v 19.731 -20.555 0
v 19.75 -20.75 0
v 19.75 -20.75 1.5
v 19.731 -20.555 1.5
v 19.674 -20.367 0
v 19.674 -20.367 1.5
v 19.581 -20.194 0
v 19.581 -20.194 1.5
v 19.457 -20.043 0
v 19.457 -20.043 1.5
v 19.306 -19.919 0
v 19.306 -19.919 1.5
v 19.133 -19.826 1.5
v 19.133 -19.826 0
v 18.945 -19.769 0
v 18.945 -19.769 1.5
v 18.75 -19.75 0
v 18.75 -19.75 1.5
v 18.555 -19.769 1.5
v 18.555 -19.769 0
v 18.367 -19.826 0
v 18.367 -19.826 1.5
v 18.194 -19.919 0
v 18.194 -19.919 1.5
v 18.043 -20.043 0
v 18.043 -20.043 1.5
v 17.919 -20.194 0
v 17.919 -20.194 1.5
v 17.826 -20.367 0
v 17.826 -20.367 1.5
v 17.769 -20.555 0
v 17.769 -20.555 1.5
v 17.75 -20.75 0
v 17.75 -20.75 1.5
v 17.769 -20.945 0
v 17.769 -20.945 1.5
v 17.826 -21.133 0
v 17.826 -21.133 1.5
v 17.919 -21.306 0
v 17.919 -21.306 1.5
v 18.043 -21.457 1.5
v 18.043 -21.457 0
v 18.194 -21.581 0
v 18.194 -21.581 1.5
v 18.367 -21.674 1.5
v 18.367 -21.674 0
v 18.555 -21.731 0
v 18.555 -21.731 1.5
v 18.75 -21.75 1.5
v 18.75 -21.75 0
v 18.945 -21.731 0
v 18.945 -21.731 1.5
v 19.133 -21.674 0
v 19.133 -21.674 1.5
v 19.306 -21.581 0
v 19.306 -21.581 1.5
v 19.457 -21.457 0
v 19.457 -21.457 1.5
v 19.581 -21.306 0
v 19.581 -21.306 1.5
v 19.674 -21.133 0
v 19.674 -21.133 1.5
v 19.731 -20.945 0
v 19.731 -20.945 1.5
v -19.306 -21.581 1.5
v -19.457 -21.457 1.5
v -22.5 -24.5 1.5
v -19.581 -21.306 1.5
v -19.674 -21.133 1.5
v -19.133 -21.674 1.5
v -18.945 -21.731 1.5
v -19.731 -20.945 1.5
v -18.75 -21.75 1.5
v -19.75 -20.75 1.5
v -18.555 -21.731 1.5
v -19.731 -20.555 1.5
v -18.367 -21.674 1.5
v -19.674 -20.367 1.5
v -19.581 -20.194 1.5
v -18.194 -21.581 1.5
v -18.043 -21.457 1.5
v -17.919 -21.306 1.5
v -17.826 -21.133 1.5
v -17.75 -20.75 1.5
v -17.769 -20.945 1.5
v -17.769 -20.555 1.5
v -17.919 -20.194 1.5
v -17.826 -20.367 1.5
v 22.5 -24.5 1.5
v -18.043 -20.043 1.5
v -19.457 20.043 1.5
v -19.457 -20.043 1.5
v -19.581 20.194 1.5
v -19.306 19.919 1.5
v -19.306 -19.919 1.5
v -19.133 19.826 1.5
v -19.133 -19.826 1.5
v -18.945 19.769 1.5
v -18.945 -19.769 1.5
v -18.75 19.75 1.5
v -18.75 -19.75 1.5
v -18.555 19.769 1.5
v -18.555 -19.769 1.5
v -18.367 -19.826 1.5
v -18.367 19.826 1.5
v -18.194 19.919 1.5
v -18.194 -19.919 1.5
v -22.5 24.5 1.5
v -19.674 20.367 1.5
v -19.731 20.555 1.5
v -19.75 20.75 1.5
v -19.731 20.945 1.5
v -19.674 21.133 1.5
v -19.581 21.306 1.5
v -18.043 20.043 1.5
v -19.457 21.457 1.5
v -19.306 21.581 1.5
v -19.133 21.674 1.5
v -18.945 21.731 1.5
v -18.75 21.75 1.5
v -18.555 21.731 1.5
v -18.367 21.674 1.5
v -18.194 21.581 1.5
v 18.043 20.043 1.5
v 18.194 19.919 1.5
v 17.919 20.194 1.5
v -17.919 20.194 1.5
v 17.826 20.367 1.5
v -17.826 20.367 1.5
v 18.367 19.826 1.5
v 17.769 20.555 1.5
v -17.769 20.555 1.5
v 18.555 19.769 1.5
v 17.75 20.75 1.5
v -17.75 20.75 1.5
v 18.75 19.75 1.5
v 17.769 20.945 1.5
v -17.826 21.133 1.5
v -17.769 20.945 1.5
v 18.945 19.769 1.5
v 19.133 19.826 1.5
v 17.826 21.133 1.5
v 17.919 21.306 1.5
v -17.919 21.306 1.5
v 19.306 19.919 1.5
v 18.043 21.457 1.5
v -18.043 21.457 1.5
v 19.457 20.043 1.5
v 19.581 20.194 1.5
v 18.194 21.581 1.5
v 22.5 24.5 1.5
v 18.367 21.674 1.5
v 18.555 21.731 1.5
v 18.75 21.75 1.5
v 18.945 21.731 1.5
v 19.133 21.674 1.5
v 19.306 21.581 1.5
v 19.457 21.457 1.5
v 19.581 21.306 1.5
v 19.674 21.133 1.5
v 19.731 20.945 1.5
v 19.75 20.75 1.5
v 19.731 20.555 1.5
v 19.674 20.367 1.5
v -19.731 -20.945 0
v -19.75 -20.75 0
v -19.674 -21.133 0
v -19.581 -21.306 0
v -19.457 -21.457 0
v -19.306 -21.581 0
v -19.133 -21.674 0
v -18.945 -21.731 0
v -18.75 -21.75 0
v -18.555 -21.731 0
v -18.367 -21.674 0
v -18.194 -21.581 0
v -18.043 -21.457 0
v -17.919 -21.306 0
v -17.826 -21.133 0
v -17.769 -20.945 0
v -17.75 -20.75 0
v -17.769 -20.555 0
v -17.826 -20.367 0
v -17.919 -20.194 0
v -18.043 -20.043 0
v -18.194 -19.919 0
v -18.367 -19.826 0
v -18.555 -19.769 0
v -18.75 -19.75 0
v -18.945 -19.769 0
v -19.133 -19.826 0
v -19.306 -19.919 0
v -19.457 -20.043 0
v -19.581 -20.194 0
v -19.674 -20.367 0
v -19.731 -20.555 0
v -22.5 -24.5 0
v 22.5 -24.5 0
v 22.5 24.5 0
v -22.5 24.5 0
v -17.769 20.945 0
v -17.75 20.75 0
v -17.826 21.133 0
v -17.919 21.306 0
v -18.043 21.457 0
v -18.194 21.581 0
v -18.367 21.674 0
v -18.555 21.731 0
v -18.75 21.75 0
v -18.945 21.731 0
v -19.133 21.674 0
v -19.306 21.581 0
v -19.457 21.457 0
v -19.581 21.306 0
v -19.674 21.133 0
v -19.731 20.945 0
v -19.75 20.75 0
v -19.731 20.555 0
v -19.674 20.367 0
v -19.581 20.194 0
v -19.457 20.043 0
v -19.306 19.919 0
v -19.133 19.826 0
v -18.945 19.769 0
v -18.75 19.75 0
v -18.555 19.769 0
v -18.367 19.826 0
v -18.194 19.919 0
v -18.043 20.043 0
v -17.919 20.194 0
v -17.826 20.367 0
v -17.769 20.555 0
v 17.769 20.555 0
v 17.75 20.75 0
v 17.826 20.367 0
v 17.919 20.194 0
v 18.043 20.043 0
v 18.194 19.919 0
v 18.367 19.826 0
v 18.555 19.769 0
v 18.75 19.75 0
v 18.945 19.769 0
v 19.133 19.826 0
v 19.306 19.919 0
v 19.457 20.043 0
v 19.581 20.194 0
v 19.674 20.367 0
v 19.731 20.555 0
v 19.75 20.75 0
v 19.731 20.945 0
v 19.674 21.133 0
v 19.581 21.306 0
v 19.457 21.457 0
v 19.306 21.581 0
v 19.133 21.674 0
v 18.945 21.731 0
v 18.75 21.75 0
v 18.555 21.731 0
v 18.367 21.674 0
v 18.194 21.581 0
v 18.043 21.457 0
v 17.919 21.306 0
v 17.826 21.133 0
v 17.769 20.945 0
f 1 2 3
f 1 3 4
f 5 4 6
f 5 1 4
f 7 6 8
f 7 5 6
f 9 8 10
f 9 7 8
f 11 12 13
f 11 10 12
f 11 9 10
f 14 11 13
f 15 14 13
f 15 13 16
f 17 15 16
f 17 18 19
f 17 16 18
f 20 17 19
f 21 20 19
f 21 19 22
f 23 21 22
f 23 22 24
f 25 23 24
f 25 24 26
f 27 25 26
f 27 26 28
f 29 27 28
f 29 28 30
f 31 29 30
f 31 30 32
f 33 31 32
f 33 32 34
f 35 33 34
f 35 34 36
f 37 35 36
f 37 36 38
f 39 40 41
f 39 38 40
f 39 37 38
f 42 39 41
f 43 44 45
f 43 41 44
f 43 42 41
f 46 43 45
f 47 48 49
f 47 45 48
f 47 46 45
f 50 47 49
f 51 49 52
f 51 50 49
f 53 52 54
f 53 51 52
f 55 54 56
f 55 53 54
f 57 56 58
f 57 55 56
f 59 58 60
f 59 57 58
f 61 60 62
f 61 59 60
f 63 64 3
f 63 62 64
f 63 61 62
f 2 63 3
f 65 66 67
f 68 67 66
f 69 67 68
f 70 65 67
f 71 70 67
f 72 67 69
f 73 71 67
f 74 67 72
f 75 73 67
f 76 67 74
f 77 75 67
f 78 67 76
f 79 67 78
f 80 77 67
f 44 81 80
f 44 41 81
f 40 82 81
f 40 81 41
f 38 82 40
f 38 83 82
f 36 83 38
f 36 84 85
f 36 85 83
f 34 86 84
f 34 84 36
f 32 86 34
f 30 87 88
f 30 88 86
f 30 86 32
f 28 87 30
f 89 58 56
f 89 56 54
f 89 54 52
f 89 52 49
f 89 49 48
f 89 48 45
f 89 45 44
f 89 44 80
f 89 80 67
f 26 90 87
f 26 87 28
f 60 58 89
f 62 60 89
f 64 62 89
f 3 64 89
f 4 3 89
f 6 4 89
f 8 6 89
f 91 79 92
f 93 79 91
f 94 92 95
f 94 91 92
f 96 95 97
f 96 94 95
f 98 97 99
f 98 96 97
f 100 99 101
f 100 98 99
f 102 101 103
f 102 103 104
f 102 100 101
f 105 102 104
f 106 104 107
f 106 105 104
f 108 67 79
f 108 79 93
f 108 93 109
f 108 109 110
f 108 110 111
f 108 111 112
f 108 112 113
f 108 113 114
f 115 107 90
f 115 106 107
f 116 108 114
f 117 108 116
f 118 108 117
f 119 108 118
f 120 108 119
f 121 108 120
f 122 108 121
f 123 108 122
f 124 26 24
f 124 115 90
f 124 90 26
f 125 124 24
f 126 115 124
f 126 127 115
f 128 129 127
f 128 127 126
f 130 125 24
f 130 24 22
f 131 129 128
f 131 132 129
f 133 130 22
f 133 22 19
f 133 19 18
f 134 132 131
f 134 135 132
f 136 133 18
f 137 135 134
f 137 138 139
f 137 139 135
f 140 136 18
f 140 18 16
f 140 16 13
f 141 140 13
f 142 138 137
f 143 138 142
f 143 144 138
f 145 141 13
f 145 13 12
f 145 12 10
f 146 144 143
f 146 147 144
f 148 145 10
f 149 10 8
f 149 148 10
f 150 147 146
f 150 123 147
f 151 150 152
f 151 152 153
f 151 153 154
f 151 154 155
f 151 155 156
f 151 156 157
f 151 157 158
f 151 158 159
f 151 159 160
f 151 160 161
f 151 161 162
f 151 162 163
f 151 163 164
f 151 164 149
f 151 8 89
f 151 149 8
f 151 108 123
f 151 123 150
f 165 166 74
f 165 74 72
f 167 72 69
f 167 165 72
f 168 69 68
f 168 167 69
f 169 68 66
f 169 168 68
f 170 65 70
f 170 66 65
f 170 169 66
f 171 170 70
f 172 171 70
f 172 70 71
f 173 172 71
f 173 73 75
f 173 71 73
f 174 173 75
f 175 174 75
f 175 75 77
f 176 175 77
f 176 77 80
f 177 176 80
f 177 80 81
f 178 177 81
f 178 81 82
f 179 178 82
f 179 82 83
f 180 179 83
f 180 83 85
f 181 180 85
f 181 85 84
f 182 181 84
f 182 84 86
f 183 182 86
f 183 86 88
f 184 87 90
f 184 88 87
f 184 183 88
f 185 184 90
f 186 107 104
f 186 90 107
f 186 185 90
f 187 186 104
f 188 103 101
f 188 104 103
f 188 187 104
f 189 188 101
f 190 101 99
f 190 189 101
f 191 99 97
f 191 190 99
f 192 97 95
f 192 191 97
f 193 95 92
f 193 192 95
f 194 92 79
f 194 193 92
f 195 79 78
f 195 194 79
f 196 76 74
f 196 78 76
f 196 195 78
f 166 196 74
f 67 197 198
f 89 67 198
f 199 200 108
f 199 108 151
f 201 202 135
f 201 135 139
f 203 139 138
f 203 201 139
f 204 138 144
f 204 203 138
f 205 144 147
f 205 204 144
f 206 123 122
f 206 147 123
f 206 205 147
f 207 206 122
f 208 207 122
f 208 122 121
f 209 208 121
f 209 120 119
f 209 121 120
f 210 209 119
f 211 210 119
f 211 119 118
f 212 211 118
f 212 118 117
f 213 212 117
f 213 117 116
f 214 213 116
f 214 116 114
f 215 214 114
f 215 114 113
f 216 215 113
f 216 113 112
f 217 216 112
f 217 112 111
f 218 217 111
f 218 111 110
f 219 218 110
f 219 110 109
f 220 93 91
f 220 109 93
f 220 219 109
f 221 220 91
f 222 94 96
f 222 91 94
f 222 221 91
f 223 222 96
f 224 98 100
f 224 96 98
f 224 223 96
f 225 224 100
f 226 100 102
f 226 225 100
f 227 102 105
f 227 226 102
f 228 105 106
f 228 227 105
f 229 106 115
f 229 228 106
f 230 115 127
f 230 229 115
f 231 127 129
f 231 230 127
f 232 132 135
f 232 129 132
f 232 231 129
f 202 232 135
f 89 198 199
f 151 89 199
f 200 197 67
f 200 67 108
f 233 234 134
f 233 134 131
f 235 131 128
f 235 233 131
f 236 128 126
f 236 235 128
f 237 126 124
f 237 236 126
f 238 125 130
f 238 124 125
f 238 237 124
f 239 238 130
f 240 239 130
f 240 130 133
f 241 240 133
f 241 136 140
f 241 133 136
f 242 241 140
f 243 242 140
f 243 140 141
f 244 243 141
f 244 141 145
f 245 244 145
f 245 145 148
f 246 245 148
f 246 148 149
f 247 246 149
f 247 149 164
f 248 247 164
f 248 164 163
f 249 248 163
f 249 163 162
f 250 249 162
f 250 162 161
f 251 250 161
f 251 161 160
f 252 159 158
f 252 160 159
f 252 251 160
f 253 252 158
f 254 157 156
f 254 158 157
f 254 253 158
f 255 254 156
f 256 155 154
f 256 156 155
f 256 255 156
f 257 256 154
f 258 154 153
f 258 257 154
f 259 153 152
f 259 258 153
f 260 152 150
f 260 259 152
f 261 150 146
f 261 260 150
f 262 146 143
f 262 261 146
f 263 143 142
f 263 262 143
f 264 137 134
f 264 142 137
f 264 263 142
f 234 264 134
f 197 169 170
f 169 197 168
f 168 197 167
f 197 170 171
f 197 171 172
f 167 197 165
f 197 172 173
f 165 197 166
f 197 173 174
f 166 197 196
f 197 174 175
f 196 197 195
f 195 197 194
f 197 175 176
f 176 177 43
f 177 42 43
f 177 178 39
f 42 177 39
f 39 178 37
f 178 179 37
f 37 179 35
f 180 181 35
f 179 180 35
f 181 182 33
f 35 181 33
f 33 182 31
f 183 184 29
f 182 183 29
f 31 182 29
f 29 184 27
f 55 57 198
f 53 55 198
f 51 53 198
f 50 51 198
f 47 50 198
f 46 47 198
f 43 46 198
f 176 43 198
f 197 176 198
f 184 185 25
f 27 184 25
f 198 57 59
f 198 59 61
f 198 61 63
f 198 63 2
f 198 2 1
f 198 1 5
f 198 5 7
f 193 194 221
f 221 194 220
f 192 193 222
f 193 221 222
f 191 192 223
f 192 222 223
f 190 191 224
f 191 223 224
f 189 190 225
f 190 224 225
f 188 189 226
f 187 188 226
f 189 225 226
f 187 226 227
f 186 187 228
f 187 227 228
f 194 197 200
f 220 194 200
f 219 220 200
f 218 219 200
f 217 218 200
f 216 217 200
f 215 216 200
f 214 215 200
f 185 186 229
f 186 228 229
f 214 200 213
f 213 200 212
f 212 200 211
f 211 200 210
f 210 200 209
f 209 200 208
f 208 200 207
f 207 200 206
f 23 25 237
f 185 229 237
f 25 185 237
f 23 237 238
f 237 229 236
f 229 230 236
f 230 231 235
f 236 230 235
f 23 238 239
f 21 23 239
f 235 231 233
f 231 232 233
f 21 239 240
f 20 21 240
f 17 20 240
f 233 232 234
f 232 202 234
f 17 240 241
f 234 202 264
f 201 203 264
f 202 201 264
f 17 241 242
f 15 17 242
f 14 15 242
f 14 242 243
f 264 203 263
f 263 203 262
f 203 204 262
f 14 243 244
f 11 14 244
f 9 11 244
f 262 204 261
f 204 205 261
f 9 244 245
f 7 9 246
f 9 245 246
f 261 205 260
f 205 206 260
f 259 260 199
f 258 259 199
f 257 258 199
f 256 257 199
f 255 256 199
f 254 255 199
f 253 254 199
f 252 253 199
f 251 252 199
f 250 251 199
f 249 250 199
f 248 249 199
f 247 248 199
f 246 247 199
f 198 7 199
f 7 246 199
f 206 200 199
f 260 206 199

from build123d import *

# Parameters (mm, degrees)
SKETCH2_W               = 45
SKETCH2_H               = 49
BOSS_EXTRUDE1_DEPTH     = 1.5
CUT_EXTRUDE1_DEPTH      = 34.297897832
CUT_EXTRUDE1_DEPTH_BACK = 34.297897832
SKETCH3_R               = 1


with BuildPart() as part:
    # Sketch2 → Boss-Extrude1 (new body)
    with BuildSketch(Plane.XY):
        Rectangle(SKETCH2_W, SKETCH2_H)
    extrude(amount=BOSS_EXTRUDE1_DEPTH)

    # Sketch3 → Cut-Extrude1 (cut, two sides: drawn at the far end of the back side and taken through both)
    with BuildSketch(Plane.XY.offset(1.5).offset(-CUT_EXTRUDE1_DEPTH_BACK)):
        with Locations((-18.75, 20.75)):
            Circle(SKETCH3_R)
        with Locations(Location((18.75, 20.75, 0), (0, 0, 180))):
            Circle(SKETCH3_R)
        with Locations((18.75, -20.75)):
            Circle(SKETCH3_R)
        with Locations(Location((-18.75, -20.75, 0), (0, 0, 180))):
            Circle(SKETCH3_R)
    extrude(amount=CUT_EXTRUDE1_DEPTH + CUT_EXTRUDE1_DEPTH_BACK, mode=Mode.SUBTRACT)


solid = part.part
